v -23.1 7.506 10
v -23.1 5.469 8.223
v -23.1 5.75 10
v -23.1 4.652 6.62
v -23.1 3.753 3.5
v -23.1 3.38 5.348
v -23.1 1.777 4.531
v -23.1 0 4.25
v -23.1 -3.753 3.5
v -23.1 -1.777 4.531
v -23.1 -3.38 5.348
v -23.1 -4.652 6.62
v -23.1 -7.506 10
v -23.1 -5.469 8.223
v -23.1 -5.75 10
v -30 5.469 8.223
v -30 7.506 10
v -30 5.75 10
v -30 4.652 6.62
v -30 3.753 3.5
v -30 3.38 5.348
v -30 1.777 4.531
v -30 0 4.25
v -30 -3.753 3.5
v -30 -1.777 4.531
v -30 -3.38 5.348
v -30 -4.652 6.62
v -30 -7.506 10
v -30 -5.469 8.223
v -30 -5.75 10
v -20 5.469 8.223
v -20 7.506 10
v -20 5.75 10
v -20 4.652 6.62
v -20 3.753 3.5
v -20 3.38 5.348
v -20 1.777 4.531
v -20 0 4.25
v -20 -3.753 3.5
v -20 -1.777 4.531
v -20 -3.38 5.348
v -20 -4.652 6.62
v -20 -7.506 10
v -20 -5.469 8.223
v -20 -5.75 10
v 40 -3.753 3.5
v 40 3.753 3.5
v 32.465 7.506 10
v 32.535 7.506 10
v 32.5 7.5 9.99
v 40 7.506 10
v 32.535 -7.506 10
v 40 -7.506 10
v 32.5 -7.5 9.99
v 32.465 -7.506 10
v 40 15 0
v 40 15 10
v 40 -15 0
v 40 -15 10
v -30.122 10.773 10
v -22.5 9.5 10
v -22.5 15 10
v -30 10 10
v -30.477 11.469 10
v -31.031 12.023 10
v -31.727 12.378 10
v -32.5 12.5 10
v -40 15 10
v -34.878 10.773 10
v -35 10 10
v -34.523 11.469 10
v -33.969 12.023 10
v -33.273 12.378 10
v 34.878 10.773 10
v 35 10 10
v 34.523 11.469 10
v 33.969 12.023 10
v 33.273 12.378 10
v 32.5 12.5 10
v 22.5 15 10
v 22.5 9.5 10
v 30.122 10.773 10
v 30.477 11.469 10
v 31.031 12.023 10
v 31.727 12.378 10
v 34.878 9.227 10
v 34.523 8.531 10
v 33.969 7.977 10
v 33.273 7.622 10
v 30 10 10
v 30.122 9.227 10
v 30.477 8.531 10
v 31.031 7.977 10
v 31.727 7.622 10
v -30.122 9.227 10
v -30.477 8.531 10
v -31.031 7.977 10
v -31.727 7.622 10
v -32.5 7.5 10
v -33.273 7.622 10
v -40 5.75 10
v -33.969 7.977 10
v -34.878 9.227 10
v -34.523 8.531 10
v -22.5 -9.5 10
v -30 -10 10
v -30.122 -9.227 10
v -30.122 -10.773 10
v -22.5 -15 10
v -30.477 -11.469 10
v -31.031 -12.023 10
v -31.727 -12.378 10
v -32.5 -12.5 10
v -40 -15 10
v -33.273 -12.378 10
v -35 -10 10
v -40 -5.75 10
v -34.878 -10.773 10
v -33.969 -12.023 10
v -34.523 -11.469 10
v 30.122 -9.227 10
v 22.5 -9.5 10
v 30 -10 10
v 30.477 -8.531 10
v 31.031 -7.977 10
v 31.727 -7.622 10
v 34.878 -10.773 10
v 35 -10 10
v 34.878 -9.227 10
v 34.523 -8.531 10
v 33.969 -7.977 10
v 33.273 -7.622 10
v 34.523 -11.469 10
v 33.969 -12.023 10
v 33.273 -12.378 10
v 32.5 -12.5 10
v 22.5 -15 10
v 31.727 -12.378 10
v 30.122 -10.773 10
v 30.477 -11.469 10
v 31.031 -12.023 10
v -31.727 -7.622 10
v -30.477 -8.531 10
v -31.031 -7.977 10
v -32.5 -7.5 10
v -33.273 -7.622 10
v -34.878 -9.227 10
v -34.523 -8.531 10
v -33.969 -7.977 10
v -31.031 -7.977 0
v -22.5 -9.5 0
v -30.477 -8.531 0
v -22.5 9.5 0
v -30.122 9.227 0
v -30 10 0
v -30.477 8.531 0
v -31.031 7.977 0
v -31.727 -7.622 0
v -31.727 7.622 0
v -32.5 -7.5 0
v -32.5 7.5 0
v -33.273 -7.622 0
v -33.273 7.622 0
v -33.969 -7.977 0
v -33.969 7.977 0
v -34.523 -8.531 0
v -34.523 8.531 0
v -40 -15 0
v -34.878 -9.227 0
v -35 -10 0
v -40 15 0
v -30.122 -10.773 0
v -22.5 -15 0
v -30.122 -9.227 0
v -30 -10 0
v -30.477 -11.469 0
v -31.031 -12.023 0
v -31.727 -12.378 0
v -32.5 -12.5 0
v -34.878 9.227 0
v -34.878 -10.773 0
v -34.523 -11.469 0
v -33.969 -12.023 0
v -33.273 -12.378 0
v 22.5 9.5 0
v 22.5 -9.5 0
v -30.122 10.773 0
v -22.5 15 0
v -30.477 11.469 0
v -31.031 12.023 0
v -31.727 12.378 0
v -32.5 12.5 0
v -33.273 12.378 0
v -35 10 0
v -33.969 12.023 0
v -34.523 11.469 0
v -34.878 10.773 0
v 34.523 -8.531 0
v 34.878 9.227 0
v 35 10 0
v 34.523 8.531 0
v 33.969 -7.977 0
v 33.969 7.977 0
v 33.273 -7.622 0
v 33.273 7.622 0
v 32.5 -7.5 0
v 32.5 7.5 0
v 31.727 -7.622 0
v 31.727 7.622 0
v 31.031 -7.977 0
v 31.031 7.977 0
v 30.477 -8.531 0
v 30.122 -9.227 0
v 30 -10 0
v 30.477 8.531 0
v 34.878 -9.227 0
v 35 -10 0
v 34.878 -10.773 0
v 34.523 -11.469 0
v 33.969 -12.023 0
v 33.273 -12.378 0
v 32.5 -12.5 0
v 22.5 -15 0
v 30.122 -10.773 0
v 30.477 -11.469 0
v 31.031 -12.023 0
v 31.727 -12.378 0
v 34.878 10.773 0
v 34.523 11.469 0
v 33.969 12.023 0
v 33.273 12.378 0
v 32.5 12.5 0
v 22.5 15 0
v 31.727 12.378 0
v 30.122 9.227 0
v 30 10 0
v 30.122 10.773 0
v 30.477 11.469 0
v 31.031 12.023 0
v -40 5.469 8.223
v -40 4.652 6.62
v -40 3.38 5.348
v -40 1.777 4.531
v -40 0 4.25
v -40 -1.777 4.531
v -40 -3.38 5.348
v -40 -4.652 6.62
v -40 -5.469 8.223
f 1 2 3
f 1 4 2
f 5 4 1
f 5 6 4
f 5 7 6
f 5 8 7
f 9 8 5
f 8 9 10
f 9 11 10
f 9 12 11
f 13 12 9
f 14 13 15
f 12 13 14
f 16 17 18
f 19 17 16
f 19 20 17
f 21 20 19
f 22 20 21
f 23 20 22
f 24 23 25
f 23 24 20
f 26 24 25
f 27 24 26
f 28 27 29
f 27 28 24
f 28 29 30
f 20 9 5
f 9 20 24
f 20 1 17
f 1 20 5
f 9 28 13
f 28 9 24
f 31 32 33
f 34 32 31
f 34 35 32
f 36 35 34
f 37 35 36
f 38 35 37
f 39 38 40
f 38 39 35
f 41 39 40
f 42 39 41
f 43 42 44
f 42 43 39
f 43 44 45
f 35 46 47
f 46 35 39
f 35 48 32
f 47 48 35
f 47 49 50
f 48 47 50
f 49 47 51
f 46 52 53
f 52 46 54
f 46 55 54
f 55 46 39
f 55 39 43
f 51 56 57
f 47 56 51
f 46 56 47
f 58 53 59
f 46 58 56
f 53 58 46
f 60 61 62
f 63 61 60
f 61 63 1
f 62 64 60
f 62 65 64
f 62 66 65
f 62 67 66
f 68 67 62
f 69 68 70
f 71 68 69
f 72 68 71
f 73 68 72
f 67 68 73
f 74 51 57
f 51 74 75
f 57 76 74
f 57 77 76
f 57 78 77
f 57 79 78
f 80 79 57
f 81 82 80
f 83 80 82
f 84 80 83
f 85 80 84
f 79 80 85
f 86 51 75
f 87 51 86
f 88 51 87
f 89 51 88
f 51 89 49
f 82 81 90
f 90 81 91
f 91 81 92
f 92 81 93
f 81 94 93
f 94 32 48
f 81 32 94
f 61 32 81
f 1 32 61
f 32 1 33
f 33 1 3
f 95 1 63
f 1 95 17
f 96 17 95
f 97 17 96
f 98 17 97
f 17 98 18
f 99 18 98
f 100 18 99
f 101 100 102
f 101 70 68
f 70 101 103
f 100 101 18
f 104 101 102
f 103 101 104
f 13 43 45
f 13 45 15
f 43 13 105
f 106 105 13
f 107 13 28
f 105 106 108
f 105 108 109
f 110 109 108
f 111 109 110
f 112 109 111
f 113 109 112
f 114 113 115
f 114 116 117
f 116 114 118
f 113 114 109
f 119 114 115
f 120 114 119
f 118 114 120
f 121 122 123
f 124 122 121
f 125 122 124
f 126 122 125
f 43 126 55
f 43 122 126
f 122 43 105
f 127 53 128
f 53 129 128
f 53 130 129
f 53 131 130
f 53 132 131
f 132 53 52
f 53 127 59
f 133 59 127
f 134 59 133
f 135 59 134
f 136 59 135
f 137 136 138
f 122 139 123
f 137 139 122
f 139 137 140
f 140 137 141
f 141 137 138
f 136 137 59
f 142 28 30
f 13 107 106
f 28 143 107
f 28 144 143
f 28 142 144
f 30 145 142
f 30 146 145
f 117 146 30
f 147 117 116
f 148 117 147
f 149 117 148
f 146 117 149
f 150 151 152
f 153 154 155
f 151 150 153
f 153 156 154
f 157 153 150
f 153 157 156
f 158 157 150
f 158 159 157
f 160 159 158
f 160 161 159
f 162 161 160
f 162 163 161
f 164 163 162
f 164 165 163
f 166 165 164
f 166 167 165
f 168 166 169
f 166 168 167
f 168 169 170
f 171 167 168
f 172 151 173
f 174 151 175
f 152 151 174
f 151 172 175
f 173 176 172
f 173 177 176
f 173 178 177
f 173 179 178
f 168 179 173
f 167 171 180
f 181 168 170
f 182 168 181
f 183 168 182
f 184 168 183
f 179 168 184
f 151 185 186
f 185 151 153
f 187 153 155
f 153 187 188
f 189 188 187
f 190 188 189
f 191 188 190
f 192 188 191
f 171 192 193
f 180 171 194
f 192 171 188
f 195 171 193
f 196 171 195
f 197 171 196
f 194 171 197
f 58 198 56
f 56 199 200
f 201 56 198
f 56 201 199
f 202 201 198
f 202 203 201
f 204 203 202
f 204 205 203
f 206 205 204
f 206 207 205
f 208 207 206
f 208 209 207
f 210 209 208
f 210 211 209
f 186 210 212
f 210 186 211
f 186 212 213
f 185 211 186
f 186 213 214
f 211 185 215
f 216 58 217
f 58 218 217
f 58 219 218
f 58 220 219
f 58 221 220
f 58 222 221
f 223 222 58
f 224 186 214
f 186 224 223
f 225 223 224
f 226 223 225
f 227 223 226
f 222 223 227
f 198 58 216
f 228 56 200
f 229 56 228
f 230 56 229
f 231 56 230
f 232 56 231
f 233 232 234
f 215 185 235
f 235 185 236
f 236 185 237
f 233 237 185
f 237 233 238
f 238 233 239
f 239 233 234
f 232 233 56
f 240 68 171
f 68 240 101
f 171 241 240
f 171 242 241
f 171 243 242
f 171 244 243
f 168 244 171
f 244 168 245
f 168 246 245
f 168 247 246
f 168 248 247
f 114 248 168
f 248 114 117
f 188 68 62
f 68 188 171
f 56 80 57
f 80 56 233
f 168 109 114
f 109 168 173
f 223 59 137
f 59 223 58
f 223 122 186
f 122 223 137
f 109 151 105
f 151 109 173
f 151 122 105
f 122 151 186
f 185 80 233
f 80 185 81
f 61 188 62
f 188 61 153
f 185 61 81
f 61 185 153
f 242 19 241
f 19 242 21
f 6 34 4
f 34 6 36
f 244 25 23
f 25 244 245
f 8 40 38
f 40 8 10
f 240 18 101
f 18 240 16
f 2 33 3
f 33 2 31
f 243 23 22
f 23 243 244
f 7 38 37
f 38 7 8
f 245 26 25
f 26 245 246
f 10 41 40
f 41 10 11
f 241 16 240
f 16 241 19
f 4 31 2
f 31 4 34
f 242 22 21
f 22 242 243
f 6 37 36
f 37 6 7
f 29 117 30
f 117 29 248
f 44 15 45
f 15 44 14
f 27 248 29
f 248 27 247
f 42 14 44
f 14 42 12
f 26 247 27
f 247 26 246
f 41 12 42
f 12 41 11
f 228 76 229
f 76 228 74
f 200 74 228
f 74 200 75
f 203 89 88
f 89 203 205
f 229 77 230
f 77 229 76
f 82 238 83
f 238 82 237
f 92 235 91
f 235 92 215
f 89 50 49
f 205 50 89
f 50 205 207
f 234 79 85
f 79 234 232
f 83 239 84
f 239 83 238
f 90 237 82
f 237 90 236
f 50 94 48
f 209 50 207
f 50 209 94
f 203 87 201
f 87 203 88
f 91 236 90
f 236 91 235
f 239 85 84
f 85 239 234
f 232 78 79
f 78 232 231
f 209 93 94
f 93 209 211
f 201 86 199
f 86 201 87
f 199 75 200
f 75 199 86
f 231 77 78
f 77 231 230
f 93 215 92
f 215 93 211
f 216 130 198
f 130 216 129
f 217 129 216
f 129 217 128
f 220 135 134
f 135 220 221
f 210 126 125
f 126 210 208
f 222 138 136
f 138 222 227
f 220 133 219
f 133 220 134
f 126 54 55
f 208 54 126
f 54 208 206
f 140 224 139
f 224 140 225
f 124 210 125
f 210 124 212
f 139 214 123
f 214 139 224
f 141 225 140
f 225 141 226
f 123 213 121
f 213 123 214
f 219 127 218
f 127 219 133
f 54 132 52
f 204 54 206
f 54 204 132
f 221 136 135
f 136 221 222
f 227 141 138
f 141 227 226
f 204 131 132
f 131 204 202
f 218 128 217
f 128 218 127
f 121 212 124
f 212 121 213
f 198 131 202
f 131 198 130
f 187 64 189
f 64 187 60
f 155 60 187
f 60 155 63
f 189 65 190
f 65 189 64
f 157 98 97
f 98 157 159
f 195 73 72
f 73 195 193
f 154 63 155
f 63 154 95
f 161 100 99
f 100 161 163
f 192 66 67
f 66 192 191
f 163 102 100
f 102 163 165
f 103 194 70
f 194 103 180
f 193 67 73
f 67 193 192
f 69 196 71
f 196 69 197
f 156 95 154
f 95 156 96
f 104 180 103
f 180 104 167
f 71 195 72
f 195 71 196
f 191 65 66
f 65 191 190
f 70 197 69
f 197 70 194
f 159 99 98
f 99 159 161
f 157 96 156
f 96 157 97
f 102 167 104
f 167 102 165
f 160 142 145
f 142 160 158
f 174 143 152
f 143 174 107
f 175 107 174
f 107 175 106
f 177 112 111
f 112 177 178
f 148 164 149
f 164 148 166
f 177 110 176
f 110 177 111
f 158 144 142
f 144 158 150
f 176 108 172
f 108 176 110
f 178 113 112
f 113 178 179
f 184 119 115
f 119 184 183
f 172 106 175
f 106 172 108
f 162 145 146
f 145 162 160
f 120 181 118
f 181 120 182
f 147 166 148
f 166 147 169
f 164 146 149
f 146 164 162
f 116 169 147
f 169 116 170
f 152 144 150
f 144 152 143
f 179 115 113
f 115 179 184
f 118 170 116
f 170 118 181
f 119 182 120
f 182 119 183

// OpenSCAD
///////////////////////////////////////////////////////////////////////////////////
// Parts for building a 3D Printer with aluminium extrusions an makerslide parts //
//                                                                               //
//  These are simple parts for using with FreeCAD (openscad module needed.       //
//  The parts are refined inside FreeCAD                                         //
//                                                                               //
//  (c) Holger Pasligh                                                           //
//  You can use this parts for your own purpose, as long you did not sell them   //
//                                                                               //
///////////////////////////////////////////////////////////////////////////////////


// Anti Backlash-Nut
// non printed parts: 2 nuts M8 an a spring with at least 8mm inner diameter


//vars
sw = 13;
hn = 6.8;
ds = 11.5;


//output
bottom();
//nut(2);

module bottom(){
difference(){
 //body
	translate([-80/2,-30/2,0])	cube([80,30,10]);
	translate([-45/2,-35/2-1,-1])cube([45,9,12]);
	translate([-45/2,35/2-8,-1])cube([45,9,12]);
 //hole for leadscrew and spring
	translate([-100/2,0,10])rotate([0,90,0])cylinder(r=ds/2, h=100, $fn=20);
 //space for nuts
	translate([-30,0,10])rotate([90,0,90])nut(6.9);
	translate([-20,0,10])rotate([90,0,90])nut(90);
 //mounting holes
	translate([65/2,20/2,-1])cylinder(r=2.5, h=20, $fn=20);
	translate([65/2,-20/2,-1])cylinder(r=2.5, h=20, $fn=20);
	translate([-65/2,20/2,-1])cylinder(r=2.5, h=20, $fn=20);
	translate([-65/2,-20/2,-1])cylinder(r=2.5, h=20, $fn=20);
}
}


module nut(length){
or = sw/sqrt(3);
translate([-or/2,-sw/2,0])union(){
	cube([or,sw,length]);
	translate([or, 0, 0])rotate([0,0,60])cube([or,sw,length]);
	translate([ 0, 0, 0])rotate([0,0,30])cube([sw,or,length]);
}
}
